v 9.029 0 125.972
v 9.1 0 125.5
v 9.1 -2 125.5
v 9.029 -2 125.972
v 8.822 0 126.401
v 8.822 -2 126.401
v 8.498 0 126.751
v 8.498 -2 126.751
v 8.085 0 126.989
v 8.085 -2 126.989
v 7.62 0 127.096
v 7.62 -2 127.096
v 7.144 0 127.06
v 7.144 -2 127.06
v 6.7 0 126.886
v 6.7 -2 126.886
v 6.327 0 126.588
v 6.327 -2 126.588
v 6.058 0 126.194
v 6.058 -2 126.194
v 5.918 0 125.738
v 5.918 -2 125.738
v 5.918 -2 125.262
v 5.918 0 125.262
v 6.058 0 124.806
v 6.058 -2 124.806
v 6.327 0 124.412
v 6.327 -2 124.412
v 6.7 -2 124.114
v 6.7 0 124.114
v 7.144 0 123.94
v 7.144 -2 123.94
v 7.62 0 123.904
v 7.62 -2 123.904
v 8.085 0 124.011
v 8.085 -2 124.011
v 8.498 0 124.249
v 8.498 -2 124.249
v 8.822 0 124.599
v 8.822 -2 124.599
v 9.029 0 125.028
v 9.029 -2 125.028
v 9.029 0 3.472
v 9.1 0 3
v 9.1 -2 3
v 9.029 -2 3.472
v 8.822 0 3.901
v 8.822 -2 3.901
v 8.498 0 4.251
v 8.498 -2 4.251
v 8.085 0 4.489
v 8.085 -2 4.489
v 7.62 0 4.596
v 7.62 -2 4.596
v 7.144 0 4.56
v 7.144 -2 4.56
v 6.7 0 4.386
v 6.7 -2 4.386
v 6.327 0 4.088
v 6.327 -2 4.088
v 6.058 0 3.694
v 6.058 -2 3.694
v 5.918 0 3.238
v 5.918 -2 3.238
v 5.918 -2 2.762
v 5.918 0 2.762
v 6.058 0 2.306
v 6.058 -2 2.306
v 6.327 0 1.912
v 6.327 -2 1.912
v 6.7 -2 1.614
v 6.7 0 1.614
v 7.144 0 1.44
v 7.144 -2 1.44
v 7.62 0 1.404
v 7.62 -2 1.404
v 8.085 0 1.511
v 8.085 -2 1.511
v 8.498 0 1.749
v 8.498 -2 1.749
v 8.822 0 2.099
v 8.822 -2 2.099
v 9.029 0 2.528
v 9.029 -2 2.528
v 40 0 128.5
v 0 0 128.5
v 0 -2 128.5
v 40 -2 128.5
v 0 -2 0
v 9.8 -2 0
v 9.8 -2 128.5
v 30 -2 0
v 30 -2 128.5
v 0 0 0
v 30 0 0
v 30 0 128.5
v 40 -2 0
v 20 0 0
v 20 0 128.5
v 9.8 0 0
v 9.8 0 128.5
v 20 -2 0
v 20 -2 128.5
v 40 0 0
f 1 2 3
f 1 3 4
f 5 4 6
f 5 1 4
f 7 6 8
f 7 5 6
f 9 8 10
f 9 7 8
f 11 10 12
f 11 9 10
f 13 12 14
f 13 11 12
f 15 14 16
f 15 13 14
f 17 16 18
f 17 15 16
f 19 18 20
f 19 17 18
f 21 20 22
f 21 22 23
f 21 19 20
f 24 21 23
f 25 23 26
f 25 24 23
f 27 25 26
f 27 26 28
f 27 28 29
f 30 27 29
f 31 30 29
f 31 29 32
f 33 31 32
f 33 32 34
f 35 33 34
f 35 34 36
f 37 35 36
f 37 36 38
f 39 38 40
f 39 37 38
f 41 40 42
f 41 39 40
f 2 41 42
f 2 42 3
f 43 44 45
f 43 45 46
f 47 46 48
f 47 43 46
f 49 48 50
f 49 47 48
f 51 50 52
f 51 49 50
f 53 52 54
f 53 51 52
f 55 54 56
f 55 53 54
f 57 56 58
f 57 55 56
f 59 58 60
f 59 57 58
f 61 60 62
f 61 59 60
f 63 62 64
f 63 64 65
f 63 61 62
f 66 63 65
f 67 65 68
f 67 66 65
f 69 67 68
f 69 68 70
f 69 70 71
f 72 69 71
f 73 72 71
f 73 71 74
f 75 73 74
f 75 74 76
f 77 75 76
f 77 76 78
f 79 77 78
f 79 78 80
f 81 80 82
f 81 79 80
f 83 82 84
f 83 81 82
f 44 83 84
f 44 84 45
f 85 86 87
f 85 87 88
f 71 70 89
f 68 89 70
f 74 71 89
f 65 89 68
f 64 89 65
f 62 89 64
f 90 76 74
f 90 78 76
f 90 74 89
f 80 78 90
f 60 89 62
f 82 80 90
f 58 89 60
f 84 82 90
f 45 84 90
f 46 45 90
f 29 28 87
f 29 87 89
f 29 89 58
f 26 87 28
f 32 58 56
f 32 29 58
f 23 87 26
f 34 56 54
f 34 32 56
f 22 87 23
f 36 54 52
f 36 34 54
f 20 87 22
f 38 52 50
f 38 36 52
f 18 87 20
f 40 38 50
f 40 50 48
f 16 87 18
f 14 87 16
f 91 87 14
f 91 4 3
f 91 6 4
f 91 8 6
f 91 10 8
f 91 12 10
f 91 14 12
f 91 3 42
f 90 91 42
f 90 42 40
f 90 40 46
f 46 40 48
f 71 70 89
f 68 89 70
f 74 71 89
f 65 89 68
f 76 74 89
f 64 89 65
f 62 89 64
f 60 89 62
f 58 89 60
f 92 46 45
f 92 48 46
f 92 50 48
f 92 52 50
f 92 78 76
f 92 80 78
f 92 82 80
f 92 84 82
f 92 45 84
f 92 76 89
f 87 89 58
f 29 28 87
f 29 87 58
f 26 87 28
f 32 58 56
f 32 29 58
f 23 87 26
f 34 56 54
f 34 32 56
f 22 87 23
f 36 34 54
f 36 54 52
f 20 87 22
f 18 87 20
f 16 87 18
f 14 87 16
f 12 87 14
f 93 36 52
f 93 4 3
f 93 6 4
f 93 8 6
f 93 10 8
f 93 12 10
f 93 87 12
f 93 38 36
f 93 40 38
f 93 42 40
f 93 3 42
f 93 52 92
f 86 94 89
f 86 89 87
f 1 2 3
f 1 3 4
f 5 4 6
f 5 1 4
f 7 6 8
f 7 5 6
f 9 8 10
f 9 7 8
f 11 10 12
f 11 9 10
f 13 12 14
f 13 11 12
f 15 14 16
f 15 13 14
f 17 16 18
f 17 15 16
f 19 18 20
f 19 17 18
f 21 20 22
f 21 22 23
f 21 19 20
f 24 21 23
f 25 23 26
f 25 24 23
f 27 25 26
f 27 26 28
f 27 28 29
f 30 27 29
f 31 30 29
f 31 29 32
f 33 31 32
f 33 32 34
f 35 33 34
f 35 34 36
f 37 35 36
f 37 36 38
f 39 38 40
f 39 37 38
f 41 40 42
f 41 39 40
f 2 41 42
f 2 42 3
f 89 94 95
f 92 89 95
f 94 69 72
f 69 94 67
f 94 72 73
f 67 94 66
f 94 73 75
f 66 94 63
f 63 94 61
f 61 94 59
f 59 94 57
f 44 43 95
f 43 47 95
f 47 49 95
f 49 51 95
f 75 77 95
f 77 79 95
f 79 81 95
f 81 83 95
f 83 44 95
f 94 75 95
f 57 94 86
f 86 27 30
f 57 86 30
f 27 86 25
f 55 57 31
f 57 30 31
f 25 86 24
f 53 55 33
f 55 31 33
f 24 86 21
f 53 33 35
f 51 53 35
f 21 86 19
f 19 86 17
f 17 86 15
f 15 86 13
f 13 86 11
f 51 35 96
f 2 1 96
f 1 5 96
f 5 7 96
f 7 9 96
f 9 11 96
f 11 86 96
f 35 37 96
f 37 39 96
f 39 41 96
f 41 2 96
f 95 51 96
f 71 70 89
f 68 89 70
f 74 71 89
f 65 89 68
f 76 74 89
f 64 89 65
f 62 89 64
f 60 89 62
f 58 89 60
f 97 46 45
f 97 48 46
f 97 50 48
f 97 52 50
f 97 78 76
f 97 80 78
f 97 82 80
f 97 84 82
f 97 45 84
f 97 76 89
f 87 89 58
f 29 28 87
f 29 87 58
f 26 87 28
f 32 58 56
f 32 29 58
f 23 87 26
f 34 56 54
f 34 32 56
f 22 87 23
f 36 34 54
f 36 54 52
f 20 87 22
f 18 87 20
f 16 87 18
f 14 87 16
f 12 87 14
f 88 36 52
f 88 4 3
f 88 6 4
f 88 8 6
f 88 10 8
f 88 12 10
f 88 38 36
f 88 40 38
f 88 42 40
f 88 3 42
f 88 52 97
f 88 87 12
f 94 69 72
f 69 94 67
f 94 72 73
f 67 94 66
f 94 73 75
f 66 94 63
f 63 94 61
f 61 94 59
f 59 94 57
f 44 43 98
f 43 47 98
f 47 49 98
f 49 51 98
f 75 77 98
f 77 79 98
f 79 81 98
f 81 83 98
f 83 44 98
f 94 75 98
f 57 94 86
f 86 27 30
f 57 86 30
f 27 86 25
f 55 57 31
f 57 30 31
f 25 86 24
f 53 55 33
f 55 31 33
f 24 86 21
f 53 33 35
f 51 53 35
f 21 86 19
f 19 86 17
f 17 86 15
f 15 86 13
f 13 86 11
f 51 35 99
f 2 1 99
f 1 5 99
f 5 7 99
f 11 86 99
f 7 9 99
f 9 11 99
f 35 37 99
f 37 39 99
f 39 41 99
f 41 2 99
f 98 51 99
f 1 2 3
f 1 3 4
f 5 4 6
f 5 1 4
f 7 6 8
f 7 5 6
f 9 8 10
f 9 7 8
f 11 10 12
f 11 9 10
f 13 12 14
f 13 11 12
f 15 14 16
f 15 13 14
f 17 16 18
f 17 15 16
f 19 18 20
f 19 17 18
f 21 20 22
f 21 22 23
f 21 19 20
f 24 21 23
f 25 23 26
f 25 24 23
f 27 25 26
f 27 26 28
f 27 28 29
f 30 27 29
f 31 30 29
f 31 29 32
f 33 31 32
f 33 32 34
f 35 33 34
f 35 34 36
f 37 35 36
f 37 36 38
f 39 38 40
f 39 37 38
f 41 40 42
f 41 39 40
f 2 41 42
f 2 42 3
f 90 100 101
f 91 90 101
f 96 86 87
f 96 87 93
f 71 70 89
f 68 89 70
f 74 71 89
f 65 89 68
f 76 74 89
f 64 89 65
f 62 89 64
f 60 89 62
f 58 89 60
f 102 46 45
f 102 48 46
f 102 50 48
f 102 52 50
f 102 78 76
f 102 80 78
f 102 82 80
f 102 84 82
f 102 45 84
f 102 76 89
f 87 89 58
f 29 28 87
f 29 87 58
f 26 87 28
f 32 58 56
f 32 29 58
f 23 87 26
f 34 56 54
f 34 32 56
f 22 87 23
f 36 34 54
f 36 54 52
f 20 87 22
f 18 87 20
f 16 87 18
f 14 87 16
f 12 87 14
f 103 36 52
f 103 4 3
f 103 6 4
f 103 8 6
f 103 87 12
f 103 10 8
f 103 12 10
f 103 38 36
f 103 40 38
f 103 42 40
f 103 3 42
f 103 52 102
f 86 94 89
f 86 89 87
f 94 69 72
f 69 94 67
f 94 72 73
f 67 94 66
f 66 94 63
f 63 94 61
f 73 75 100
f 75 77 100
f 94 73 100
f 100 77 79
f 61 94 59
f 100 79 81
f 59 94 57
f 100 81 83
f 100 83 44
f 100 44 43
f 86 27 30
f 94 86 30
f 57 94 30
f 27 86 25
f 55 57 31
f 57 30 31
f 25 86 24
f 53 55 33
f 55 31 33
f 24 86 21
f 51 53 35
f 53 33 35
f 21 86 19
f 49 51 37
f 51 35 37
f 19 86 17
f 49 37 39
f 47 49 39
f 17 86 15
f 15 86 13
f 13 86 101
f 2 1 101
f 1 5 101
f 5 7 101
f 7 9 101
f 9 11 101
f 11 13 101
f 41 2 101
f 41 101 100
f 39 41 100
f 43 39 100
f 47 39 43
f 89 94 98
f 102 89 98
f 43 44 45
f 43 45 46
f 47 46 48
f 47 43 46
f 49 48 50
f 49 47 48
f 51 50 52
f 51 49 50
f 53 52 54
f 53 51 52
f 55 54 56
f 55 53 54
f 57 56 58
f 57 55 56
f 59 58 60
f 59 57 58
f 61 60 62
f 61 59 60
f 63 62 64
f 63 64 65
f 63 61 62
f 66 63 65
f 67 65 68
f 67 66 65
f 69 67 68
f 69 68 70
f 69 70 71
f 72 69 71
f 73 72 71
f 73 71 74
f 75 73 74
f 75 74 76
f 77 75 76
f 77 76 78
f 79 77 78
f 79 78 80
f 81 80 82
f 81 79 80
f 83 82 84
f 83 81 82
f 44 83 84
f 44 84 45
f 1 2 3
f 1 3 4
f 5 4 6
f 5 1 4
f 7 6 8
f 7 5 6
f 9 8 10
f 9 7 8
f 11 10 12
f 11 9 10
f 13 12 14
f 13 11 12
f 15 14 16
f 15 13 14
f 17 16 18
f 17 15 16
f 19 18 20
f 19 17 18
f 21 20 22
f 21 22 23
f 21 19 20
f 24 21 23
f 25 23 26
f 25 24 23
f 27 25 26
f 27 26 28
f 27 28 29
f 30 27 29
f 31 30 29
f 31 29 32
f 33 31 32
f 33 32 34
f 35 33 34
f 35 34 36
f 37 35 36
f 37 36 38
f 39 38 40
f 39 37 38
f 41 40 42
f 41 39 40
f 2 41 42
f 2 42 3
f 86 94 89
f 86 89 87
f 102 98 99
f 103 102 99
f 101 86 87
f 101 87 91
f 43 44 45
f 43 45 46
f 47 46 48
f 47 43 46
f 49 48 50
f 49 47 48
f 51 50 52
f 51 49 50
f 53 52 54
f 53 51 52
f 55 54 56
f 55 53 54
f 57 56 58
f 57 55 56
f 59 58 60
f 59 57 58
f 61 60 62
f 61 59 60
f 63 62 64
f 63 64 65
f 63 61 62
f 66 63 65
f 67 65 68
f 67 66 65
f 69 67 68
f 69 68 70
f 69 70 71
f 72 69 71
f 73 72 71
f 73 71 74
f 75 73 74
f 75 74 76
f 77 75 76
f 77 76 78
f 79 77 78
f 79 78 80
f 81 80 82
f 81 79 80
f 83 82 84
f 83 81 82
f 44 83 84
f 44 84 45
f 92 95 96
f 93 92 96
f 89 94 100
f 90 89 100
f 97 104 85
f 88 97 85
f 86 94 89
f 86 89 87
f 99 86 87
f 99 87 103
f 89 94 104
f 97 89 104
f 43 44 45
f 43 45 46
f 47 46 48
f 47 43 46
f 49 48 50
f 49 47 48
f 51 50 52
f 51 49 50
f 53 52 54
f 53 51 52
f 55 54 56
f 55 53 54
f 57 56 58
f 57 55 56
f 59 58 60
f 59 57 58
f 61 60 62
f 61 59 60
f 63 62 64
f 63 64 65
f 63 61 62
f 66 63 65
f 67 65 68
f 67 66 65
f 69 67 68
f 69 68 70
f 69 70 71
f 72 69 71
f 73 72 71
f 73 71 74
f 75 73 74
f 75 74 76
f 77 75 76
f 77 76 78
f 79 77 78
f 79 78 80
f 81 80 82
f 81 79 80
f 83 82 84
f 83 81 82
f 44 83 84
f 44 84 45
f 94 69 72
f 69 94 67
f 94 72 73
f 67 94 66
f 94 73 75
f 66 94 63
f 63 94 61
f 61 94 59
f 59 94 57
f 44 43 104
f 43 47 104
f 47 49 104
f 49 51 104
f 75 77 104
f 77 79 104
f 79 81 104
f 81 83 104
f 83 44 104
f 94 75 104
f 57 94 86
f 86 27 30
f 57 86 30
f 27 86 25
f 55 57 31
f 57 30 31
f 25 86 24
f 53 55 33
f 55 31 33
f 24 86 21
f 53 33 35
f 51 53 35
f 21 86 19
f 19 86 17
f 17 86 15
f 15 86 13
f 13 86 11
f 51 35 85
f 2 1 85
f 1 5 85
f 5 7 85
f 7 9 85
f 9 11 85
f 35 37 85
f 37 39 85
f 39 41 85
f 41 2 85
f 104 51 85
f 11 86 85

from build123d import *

# Parameters (mm, degrees)
SKETCH003_W  = 40
SKETCH003_H  = 128.5
SKETCH003_R  = 1.6
PAD003_DEPTH = 2
SKETCH002_W  = 20
SKETCH002_H  = 128.5
SKETCH002_R  = 1.6
PAD002_DEPTH = 2
SKETCH001_W  = 30
SKETCH001_H  = 128.5
SKETCH001_R  = 1.6
PAD001_DEPTH = 2
SKETCH004_W  = 9.8
SKETCH004_H  = 128.5
SKETCH004_R  = 1.6
PAD004_DEPTH = 2


with BuildPart() as f_8u:
    # Sketch003 → Pad003 (new body)
    with BuildSketch(Plane.XZ):
        with Locations((20, 64.25)):
            Rectangle(SKETCH003_W, SKETCH003_H)
        with Locations((7.5, 125.5)):
            Circle(SKETCH003_R, mode=Mode.SUBTRACT)
        with Locations((7.5, 3)):
            Circle(SKETCH003_R, mode=Mode.SUBTRACT)
    extrude(amount=PAD003_DEPTH)


with BuildPart() as f_4u:
    # Sketch002 → Pad002 (new body)
    with BuildSketch(Plane.XZ):
        with Locations((10, 64.25)):
            Rectangle(SKETCH002_W, SKETCH002_H)
        with Locations((7.5, 125.5)):
            Circle(SKETCH002_R, mode=Mode.SUBTRACT)
        with Locations((7.5, 3)):
            Circle(SKETCH002_R, mode=Mode.SUBTRACT)
    extrude(amount=PAD002_DEPTH)


with BuildPart() as f_6u:
    # Sketch001 → Pad001 (new body)
    with BuildSketch(Plane.XZ):
        with Locations((15, 64.25)):
            Rectangle(SKETCH001_W, SKETCH001_H)
        with Locations((7.5, 125.5)):
            Circle(SKETCH001_R, mode=Mode.SUBTRACT)
        with Locations((7.5, 3)):
            Circle(SKETCH001_R, mode=Mode.SUBTRACT)
    extrude(amount=PAD001_DEPTH)


with BuildPart() as f_2u:
    # Sketch004 → Pad004 (new body)
    with BuildSketch(Plane.XZ):
        with Locations((4.9, 64.25)):
            Rectangle(SKETCH004_W, SKETCH004_H)
        with Locations((7.5, 125.5)):
            Circle(SKETCH004_R, mode=Mode.SUBTRACT)
        with Locations((7.5, 3)):
            Circle(SKETCH004_R, mode=Mode.SUBTRACT)
    extrude(amount=PAD004_DEPTH)


solid = Compound([f_8u.part, f_4u.part, f_6u.part, f_2u.part])
